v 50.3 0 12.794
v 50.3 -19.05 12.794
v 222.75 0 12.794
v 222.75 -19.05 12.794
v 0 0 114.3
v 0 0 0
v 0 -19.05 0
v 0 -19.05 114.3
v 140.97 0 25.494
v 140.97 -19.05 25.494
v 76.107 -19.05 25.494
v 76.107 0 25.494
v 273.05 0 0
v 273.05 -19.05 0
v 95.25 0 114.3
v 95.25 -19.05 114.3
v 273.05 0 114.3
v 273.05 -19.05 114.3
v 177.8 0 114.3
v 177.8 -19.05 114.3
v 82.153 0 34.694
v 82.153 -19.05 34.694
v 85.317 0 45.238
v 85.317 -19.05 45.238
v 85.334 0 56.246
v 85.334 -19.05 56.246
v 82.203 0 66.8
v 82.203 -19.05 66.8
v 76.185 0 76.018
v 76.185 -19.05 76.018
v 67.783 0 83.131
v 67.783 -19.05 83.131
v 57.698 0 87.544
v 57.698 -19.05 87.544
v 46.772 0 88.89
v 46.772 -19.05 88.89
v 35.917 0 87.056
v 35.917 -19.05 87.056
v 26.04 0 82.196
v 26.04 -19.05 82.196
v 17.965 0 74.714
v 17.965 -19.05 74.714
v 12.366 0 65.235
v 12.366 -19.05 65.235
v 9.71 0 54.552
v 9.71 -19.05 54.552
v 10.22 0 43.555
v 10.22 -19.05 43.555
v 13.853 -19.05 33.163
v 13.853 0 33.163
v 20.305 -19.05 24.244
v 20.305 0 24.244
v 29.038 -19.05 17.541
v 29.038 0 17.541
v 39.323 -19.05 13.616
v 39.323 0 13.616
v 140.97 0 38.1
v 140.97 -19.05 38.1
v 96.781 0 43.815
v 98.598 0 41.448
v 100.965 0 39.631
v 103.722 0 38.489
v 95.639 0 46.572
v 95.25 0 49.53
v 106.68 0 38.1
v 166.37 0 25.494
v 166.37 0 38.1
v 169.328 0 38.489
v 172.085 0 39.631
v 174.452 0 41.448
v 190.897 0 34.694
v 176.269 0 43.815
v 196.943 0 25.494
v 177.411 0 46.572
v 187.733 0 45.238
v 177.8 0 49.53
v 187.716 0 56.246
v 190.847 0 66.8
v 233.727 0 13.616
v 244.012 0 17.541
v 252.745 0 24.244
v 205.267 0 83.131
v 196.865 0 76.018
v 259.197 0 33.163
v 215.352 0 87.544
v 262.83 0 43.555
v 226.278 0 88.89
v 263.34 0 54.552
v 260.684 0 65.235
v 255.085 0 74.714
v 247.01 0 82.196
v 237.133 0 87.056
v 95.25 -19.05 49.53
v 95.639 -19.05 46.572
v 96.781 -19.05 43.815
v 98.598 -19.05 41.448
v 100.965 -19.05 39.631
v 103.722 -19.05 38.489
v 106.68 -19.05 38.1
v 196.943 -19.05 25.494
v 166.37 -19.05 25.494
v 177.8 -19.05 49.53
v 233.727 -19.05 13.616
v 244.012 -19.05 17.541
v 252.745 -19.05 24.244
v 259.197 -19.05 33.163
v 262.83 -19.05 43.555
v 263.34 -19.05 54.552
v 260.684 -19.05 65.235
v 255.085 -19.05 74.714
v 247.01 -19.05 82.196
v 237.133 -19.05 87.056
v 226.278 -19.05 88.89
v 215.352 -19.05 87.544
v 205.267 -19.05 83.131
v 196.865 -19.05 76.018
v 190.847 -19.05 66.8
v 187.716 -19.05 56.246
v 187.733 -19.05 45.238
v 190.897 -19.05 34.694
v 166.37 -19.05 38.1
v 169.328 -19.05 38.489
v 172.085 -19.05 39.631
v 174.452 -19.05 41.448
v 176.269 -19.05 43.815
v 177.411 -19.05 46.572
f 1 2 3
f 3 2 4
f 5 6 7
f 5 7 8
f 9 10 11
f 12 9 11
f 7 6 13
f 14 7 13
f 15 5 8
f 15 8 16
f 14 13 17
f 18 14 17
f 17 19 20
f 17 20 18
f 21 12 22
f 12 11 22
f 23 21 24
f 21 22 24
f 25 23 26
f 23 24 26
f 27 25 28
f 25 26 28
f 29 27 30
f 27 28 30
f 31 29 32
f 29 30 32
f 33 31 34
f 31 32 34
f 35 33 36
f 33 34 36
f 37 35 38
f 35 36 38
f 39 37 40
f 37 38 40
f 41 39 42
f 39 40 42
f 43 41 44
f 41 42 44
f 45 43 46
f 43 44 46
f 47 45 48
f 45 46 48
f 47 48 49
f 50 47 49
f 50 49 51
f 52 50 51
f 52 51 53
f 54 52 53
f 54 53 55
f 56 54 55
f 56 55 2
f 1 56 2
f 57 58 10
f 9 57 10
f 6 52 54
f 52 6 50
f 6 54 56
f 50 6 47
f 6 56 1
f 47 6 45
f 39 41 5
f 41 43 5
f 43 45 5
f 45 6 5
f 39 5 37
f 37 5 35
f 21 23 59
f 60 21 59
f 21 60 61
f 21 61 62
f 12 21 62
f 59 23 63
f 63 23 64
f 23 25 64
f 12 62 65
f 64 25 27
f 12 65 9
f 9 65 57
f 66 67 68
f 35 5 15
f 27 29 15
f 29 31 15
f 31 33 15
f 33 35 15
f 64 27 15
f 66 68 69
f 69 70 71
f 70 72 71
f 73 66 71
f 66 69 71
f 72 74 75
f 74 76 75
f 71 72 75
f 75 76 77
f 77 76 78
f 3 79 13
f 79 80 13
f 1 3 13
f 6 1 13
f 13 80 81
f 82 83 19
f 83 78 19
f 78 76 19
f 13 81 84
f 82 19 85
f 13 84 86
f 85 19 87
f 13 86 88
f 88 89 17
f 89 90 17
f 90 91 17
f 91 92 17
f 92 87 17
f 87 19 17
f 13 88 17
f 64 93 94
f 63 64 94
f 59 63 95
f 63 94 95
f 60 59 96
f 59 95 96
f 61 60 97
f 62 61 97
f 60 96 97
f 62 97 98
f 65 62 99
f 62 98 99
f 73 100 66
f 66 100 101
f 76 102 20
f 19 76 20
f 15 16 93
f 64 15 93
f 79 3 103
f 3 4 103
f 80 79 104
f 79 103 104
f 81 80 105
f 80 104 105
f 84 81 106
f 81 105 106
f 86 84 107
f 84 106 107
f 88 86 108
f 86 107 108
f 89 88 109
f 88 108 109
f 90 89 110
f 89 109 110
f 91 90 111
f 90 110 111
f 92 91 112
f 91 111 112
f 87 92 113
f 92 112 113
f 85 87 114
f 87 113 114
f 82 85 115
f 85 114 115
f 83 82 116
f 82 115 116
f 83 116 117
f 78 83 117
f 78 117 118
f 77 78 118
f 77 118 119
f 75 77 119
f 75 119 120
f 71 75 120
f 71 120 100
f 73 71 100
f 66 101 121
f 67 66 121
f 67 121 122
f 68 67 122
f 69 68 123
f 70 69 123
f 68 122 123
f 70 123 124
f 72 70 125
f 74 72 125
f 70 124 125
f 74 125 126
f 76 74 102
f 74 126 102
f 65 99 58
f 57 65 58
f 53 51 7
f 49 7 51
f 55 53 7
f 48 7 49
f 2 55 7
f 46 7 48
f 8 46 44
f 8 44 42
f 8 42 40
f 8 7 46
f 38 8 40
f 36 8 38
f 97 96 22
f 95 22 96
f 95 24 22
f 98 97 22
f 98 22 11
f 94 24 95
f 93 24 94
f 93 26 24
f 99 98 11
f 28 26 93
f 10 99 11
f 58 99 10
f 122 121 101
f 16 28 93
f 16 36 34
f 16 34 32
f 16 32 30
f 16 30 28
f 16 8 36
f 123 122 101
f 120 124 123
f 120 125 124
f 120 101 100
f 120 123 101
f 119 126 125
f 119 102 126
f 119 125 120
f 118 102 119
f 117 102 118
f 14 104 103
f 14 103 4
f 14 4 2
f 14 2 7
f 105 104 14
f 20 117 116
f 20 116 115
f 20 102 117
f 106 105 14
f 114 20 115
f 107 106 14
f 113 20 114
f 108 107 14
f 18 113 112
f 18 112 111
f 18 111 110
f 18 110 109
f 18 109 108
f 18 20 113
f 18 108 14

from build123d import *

# Parameters (mm, degrees)
F0_W     = 273.05
F0_H     = 114.3
F1_DEPTH = 19.05
F2_R     = 38.1
F3_DEPTH = 25.4
F5_DEPTH = 25.4
F7_DEPTH = 25.4


with BuildPart() as f1:
    # F0 (on Front) → F1 (new body)
    with BuildSketch(Plane.XZ):
        with Locations((136.525, 57.15)):
            Rectangle(F0_W, F0_H)
    extrude(amount=F1_DEPTH)

    # F2 (on face) → F3 (cut)
    with BuildSketch(Plane.XZ.offset(19.05)):
        with Locations((225.425, 50.8)):
            Circle(F2_R)
        with Locations((47.625, 50.8)):
            Circle(F2_R)
    extrude(amount=-F3_DEPTH, mode=Mode.SUBTRACT)

    # F4 (on face) → F5 (cut)
    with BuildSketch(Plane.XZ.offset(19.05)):
        with BuildLine():
            Line((177.8, 114.3), (95.25, 114.3))
            Line((95.25, 114.3), (95.25, 49.53))
            ThreePointArc((95.25, 49.53), (98.597769, 41.447769), (106.68, 38.1))
            Line((106.68, 38.1), (166.37, 38.1))
            ThreePointArc((166.37, 38.1), (174.452231, 41.447769), (177.8, 49.53))
            Line((177.8, 49.53), (177.8, 114.3))
        make_face()
    extrude(amount=-F5_DEPTH, mode=Mode.SUBTRACT)

    # F6 (on face) → F7 (cut)
    with BuildSketch(Plane.XZ.offset(19.05)):
        Polygon((166.37, 25.494051), (166.37, 38.1), (140.97, 38.1), (140.97, 25.494051), (76.106905, 25.494051), (50.300408, 12.794051), (228.100408, 12.794051), (196.943095, 25.494051), align=None)
    extrude(amount=-F7_DEPTH, mode=Mode.SUBTRACT)


solid = f1.part
